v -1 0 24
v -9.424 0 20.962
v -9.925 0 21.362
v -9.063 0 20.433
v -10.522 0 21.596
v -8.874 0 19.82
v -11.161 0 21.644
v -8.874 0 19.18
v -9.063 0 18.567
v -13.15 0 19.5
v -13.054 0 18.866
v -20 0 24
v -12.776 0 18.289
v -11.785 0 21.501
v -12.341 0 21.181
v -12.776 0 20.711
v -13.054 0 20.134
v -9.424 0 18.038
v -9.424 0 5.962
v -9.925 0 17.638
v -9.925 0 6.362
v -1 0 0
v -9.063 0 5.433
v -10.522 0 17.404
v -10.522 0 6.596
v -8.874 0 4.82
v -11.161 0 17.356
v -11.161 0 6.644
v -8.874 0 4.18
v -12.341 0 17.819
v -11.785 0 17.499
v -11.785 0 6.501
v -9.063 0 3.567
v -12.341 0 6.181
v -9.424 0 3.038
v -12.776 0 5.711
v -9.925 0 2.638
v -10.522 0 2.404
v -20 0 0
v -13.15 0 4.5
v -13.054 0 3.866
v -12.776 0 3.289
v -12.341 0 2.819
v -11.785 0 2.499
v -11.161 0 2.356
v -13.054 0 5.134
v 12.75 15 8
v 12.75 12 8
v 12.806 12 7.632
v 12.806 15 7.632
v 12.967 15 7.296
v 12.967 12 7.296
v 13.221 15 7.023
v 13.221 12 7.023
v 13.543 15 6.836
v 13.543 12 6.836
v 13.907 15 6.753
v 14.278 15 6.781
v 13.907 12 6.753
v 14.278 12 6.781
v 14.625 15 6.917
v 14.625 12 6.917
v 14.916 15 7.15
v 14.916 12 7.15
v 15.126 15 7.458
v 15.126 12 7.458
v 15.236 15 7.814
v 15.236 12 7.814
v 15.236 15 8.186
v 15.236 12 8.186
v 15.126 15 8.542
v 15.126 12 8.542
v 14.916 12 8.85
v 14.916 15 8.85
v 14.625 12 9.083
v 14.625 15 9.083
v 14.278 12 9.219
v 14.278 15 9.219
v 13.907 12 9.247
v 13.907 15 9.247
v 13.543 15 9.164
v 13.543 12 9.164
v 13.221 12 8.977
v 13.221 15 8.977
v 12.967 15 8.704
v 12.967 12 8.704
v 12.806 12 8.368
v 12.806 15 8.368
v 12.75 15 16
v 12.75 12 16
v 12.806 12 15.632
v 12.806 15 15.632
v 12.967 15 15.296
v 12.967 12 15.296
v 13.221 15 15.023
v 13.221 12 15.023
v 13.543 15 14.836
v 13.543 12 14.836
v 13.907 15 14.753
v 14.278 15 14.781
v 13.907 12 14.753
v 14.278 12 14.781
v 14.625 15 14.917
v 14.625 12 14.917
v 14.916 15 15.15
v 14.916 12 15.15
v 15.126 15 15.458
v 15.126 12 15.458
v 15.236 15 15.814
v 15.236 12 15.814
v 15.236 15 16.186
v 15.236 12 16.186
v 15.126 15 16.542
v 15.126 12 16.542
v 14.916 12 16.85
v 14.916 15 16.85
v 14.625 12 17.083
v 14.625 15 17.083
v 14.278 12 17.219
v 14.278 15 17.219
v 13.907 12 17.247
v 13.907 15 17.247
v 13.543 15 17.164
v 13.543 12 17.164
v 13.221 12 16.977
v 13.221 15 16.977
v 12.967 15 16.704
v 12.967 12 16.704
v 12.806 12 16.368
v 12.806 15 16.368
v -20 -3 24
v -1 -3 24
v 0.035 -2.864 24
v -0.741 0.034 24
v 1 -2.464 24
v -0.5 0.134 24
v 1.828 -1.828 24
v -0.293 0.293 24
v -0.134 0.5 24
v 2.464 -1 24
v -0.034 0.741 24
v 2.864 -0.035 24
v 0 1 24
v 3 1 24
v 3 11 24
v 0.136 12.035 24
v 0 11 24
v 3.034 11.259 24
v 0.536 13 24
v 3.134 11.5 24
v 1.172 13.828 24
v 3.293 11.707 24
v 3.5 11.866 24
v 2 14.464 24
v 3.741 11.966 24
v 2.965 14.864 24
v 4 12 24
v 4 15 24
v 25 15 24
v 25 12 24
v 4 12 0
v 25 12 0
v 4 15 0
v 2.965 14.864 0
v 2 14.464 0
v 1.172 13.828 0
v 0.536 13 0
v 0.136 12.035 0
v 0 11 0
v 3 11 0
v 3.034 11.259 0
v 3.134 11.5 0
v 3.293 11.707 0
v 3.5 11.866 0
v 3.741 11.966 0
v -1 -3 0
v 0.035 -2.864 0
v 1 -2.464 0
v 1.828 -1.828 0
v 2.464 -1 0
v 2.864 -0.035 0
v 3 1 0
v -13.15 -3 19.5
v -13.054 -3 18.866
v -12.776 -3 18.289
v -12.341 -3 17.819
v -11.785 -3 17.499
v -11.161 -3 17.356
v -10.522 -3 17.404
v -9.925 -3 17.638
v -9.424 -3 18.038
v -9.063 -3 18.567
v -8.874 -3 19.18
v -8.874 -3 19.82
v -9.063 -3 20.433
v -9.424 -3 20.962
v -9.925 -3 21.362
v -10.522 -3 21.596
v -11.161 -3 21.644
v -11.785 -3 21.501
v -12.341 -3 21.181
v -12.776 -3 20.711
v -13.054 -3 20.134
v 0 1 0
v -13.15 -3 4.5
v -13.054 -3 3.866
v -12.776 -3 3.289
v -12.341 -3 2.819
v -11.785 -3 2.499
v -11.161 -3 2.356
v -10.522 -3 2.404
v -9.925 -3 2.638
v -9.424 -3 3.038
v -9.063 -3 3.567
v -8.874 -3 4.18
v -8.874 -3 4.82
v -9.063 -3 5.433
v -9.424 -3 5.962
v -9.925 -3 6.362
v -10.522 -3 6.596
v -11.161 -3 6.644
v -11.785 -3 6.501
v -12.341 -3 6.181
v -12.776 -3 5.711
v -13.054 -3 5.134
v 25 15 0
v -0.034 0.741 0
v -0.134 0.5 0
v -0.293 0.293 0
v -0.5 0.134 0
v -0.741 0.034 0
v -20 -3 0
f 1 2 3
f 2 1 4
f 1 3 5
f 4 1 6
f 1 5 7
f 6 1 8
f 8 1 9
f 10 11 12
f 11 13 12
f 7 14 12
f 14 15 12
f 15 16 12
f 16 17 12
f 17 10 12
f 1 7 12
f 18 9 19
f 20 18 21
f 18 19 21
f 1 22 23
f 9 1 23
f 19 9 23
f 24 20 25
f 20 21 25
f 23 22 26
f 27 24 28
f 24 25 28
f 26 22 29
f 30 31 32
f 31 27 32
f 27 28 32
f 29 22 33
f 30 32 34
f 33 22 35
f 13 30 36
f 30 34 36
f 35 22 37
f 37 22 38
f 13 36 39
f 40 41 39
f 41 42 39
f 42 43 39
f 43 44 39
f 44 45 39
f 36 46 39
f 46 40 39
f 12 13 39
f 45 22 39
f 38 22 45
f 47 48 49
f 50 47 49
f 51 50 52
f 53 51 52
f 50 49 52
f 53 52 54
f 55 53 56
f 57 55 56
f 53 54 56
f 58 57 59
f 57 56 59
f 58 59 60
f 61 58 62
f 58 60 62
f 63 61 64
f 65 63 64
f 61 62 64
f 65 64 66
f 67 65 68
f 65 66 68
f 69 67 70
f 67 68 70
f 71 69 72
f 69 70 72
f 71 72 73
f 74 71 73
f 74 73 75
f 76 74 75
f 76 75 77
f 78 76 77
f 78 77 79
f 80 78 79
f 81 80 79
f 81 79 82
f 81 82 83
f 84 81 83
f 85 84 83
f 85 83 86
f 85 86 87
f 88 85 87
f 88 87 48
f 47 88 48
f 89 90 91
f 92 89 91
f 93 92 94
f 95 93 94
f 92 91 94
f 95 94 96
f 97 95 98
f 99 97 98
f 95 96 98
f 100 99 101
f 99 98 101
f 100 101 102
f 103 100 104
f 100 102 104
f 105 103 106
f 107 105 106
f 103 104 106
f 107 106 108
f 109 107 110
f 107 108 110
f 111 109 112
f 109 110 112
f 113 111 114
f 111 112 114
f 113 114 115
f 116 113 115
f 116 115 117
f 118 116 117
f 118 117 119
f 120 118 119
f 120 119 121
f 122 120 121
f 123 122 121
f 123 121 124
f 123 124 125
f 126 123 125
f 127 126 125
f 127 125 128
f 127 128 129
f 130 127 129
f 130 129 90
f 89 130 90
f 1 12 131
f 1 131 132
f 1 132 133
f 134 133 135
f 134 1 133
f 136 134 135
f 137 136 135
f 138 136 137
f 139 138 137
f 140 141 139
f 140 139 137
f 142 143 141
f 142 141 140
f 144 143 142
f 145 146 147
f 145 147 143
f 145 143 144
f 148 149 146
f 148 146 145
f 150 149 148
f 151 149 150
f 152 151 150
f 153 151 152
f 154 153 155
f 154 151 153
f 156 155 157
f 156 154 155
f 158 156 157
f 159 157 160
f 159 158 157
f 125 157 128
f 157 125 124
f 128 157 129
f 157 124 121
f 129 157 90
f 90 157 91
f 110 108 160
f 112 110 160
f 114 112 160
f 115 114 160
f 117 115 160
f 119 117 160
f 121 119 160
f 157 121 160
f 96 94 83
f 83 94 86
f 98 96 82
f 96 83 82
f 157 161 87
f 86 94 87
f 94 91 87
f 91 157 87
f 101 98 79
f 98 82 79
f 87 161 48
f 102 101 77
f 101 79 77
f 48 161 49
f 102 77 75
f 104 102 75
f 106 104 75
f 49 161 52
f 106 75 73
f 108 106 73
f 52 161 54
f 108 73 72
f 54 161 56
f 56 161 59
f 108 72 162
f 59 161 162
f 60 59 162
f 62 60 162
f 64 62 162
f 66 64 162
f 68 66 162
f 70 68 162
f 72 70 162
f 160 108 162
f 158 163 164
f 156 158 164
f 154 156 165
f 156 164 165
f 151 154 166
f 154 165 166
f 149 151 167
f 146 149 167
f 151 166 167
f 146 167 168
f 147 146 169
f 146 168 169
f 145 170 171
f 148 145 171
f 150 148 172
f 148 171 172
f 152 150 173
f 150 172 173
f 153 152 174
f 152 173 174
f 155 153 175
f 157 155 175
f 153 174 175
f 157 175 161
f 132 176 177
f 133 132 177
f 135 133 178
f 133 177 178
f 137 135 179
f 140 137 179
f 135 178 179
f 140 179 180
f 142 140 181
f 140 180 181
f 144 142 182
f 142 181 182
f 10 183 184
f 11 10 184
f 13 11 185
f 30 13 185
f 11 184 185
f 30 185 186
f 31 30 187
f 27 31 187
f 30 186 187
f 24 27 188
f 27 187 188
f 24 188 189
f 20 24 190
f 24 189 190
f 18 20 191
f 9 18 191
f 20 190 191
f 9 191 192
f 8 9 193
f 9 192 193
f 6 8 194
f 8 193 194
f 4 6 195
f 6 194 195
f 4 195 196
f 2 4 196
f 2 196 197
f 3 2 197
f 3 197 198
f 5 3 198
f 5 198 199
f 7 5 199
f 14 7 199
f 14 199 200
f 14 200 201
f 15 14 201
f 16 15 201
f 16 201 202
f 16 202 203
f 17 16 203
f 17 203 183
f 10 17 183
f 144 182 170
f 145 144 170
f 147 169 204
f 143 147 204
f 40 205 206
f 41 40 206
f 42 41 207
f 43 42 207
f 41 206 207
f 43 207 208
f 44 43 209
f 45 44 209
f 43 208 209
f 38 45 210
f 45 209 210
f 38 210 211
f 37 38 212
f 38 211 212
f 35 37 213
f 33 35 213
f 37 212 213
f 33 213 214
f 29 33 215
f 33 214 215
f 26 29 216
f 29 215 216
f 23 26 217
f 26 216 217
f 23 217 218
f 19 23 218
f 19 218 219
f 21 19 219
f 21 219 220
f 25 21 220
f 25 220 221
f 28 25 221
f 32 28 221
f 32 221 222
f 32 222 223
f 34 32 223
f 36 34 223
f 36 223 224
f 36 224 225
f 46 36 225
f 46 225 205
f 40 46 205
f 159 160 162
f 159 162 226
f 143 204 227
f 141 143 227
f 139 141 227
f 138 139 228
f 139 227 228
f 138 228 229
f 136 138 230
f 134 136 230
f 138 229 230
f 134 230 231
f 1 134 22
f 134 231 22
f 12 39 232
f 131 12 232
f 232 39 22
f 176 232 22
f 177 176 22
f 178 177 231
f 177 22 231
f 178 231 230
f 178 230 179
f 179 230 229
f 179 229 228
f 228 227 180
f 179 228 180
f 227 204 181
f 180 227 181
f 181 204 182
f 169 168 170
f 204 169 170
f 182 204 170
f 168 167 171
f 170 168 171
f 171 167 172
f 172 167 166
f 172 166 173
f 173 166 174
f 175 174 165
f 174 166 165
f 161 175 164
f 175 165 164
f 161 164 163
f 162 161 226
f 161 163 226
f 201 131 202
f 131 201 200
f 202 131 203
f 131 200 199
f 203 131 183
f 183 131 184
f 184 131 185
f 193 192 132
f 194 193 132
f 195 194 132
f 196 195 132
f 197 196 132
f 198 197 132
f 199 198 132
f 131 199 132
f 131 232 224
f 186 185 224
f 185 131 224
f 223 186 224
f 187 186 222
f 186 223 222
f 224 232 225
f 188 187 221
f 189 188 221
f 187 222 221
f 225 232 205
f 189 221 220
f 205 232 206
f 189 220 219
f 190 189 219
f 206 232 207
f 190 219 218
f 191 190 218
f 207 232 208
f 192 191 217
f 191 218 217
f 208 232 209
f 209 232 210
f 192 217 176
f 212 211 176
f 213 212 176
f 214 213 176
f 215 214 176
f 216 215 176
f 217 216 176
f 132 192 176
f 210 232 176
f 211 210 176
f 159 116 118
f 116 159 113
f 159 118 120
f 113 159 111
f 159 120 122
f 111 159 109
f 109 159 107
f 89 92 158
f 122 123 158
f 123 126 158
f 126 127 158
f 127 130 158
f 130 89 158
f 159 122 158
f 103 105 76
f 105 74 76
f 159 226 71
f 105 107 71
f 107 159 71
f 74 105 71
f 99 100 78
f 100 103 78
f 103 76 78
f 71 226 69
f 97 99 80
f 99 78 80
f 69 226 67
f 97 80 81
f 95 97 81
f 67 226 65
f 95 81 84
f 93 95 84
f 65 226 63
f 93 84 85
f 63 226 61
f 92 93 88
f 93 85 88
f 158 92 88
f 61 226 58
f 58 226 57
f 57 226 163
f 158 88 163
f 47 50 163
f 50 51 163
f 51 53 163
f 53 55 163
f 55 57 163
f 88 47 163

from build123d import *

# Parameters (mm, degrees)
SM_BASE_FLANGE_1_DEPTH = 24
HOLE_WIZARD_M4_1_D     = 4.3
M3X0_5_1_D             = 2.5


# Sheet-metal steps are written as plain solids
with BuildPart() as part:
    # Sketch 1 → 基材-凸緣1 (new body)
    with BuildSketch(Plane.XY):
        with BuildLine():
            Line((25, 15), (4, 15))
            ThreePointArc((4, 15), (1.171572875, 13.828427125), (0, 11))
            Line((0, 11), (0, 1))
            ThreePointArc((0, 1), (-0.292893219, 0.292893219), (-1, 0))
            Line((-1, 0), (-20, 0))
            Line((-20, 0), (-20, -3))
            Line((-20, -3), (-1, -3))
            ThreePointArc((-1, -3), (1.828427125, -1.828427125), (3, 1))
            Line((3, 1), (3, 11))
            ThreePointArc((3, 11), (3.292893219, 11.707106781), (4, 12))
            Line((4, 12), (25, 12))
            Line((25, 12), (25, 15))
        make_face()
    extrude(amount=SM_BASE_FLANGE_1_DEPTH)

    # M4 餘隙孔1 (through all)
    with Locations(Plane(origin=(0, 0, 0), x_dir=(1, 0, 0), z_dir=(0, 1, 0))):
        with Locations((-11, -19.5), (-11, -4.5)):
            Hole(HOLE_WIZARD_M4_1_D / 2)

    # M3x0.5 螺紋孔1 (through all)
    with Locations(Plane(origin=(0, 15, 0), x_dir=(1, 0, 0), z_dir=(0, 1, 0))):
        with Locations((14, -16), (14, -8)):
            Hole(M3X0_5_1_D / 2)


solid = part.part
